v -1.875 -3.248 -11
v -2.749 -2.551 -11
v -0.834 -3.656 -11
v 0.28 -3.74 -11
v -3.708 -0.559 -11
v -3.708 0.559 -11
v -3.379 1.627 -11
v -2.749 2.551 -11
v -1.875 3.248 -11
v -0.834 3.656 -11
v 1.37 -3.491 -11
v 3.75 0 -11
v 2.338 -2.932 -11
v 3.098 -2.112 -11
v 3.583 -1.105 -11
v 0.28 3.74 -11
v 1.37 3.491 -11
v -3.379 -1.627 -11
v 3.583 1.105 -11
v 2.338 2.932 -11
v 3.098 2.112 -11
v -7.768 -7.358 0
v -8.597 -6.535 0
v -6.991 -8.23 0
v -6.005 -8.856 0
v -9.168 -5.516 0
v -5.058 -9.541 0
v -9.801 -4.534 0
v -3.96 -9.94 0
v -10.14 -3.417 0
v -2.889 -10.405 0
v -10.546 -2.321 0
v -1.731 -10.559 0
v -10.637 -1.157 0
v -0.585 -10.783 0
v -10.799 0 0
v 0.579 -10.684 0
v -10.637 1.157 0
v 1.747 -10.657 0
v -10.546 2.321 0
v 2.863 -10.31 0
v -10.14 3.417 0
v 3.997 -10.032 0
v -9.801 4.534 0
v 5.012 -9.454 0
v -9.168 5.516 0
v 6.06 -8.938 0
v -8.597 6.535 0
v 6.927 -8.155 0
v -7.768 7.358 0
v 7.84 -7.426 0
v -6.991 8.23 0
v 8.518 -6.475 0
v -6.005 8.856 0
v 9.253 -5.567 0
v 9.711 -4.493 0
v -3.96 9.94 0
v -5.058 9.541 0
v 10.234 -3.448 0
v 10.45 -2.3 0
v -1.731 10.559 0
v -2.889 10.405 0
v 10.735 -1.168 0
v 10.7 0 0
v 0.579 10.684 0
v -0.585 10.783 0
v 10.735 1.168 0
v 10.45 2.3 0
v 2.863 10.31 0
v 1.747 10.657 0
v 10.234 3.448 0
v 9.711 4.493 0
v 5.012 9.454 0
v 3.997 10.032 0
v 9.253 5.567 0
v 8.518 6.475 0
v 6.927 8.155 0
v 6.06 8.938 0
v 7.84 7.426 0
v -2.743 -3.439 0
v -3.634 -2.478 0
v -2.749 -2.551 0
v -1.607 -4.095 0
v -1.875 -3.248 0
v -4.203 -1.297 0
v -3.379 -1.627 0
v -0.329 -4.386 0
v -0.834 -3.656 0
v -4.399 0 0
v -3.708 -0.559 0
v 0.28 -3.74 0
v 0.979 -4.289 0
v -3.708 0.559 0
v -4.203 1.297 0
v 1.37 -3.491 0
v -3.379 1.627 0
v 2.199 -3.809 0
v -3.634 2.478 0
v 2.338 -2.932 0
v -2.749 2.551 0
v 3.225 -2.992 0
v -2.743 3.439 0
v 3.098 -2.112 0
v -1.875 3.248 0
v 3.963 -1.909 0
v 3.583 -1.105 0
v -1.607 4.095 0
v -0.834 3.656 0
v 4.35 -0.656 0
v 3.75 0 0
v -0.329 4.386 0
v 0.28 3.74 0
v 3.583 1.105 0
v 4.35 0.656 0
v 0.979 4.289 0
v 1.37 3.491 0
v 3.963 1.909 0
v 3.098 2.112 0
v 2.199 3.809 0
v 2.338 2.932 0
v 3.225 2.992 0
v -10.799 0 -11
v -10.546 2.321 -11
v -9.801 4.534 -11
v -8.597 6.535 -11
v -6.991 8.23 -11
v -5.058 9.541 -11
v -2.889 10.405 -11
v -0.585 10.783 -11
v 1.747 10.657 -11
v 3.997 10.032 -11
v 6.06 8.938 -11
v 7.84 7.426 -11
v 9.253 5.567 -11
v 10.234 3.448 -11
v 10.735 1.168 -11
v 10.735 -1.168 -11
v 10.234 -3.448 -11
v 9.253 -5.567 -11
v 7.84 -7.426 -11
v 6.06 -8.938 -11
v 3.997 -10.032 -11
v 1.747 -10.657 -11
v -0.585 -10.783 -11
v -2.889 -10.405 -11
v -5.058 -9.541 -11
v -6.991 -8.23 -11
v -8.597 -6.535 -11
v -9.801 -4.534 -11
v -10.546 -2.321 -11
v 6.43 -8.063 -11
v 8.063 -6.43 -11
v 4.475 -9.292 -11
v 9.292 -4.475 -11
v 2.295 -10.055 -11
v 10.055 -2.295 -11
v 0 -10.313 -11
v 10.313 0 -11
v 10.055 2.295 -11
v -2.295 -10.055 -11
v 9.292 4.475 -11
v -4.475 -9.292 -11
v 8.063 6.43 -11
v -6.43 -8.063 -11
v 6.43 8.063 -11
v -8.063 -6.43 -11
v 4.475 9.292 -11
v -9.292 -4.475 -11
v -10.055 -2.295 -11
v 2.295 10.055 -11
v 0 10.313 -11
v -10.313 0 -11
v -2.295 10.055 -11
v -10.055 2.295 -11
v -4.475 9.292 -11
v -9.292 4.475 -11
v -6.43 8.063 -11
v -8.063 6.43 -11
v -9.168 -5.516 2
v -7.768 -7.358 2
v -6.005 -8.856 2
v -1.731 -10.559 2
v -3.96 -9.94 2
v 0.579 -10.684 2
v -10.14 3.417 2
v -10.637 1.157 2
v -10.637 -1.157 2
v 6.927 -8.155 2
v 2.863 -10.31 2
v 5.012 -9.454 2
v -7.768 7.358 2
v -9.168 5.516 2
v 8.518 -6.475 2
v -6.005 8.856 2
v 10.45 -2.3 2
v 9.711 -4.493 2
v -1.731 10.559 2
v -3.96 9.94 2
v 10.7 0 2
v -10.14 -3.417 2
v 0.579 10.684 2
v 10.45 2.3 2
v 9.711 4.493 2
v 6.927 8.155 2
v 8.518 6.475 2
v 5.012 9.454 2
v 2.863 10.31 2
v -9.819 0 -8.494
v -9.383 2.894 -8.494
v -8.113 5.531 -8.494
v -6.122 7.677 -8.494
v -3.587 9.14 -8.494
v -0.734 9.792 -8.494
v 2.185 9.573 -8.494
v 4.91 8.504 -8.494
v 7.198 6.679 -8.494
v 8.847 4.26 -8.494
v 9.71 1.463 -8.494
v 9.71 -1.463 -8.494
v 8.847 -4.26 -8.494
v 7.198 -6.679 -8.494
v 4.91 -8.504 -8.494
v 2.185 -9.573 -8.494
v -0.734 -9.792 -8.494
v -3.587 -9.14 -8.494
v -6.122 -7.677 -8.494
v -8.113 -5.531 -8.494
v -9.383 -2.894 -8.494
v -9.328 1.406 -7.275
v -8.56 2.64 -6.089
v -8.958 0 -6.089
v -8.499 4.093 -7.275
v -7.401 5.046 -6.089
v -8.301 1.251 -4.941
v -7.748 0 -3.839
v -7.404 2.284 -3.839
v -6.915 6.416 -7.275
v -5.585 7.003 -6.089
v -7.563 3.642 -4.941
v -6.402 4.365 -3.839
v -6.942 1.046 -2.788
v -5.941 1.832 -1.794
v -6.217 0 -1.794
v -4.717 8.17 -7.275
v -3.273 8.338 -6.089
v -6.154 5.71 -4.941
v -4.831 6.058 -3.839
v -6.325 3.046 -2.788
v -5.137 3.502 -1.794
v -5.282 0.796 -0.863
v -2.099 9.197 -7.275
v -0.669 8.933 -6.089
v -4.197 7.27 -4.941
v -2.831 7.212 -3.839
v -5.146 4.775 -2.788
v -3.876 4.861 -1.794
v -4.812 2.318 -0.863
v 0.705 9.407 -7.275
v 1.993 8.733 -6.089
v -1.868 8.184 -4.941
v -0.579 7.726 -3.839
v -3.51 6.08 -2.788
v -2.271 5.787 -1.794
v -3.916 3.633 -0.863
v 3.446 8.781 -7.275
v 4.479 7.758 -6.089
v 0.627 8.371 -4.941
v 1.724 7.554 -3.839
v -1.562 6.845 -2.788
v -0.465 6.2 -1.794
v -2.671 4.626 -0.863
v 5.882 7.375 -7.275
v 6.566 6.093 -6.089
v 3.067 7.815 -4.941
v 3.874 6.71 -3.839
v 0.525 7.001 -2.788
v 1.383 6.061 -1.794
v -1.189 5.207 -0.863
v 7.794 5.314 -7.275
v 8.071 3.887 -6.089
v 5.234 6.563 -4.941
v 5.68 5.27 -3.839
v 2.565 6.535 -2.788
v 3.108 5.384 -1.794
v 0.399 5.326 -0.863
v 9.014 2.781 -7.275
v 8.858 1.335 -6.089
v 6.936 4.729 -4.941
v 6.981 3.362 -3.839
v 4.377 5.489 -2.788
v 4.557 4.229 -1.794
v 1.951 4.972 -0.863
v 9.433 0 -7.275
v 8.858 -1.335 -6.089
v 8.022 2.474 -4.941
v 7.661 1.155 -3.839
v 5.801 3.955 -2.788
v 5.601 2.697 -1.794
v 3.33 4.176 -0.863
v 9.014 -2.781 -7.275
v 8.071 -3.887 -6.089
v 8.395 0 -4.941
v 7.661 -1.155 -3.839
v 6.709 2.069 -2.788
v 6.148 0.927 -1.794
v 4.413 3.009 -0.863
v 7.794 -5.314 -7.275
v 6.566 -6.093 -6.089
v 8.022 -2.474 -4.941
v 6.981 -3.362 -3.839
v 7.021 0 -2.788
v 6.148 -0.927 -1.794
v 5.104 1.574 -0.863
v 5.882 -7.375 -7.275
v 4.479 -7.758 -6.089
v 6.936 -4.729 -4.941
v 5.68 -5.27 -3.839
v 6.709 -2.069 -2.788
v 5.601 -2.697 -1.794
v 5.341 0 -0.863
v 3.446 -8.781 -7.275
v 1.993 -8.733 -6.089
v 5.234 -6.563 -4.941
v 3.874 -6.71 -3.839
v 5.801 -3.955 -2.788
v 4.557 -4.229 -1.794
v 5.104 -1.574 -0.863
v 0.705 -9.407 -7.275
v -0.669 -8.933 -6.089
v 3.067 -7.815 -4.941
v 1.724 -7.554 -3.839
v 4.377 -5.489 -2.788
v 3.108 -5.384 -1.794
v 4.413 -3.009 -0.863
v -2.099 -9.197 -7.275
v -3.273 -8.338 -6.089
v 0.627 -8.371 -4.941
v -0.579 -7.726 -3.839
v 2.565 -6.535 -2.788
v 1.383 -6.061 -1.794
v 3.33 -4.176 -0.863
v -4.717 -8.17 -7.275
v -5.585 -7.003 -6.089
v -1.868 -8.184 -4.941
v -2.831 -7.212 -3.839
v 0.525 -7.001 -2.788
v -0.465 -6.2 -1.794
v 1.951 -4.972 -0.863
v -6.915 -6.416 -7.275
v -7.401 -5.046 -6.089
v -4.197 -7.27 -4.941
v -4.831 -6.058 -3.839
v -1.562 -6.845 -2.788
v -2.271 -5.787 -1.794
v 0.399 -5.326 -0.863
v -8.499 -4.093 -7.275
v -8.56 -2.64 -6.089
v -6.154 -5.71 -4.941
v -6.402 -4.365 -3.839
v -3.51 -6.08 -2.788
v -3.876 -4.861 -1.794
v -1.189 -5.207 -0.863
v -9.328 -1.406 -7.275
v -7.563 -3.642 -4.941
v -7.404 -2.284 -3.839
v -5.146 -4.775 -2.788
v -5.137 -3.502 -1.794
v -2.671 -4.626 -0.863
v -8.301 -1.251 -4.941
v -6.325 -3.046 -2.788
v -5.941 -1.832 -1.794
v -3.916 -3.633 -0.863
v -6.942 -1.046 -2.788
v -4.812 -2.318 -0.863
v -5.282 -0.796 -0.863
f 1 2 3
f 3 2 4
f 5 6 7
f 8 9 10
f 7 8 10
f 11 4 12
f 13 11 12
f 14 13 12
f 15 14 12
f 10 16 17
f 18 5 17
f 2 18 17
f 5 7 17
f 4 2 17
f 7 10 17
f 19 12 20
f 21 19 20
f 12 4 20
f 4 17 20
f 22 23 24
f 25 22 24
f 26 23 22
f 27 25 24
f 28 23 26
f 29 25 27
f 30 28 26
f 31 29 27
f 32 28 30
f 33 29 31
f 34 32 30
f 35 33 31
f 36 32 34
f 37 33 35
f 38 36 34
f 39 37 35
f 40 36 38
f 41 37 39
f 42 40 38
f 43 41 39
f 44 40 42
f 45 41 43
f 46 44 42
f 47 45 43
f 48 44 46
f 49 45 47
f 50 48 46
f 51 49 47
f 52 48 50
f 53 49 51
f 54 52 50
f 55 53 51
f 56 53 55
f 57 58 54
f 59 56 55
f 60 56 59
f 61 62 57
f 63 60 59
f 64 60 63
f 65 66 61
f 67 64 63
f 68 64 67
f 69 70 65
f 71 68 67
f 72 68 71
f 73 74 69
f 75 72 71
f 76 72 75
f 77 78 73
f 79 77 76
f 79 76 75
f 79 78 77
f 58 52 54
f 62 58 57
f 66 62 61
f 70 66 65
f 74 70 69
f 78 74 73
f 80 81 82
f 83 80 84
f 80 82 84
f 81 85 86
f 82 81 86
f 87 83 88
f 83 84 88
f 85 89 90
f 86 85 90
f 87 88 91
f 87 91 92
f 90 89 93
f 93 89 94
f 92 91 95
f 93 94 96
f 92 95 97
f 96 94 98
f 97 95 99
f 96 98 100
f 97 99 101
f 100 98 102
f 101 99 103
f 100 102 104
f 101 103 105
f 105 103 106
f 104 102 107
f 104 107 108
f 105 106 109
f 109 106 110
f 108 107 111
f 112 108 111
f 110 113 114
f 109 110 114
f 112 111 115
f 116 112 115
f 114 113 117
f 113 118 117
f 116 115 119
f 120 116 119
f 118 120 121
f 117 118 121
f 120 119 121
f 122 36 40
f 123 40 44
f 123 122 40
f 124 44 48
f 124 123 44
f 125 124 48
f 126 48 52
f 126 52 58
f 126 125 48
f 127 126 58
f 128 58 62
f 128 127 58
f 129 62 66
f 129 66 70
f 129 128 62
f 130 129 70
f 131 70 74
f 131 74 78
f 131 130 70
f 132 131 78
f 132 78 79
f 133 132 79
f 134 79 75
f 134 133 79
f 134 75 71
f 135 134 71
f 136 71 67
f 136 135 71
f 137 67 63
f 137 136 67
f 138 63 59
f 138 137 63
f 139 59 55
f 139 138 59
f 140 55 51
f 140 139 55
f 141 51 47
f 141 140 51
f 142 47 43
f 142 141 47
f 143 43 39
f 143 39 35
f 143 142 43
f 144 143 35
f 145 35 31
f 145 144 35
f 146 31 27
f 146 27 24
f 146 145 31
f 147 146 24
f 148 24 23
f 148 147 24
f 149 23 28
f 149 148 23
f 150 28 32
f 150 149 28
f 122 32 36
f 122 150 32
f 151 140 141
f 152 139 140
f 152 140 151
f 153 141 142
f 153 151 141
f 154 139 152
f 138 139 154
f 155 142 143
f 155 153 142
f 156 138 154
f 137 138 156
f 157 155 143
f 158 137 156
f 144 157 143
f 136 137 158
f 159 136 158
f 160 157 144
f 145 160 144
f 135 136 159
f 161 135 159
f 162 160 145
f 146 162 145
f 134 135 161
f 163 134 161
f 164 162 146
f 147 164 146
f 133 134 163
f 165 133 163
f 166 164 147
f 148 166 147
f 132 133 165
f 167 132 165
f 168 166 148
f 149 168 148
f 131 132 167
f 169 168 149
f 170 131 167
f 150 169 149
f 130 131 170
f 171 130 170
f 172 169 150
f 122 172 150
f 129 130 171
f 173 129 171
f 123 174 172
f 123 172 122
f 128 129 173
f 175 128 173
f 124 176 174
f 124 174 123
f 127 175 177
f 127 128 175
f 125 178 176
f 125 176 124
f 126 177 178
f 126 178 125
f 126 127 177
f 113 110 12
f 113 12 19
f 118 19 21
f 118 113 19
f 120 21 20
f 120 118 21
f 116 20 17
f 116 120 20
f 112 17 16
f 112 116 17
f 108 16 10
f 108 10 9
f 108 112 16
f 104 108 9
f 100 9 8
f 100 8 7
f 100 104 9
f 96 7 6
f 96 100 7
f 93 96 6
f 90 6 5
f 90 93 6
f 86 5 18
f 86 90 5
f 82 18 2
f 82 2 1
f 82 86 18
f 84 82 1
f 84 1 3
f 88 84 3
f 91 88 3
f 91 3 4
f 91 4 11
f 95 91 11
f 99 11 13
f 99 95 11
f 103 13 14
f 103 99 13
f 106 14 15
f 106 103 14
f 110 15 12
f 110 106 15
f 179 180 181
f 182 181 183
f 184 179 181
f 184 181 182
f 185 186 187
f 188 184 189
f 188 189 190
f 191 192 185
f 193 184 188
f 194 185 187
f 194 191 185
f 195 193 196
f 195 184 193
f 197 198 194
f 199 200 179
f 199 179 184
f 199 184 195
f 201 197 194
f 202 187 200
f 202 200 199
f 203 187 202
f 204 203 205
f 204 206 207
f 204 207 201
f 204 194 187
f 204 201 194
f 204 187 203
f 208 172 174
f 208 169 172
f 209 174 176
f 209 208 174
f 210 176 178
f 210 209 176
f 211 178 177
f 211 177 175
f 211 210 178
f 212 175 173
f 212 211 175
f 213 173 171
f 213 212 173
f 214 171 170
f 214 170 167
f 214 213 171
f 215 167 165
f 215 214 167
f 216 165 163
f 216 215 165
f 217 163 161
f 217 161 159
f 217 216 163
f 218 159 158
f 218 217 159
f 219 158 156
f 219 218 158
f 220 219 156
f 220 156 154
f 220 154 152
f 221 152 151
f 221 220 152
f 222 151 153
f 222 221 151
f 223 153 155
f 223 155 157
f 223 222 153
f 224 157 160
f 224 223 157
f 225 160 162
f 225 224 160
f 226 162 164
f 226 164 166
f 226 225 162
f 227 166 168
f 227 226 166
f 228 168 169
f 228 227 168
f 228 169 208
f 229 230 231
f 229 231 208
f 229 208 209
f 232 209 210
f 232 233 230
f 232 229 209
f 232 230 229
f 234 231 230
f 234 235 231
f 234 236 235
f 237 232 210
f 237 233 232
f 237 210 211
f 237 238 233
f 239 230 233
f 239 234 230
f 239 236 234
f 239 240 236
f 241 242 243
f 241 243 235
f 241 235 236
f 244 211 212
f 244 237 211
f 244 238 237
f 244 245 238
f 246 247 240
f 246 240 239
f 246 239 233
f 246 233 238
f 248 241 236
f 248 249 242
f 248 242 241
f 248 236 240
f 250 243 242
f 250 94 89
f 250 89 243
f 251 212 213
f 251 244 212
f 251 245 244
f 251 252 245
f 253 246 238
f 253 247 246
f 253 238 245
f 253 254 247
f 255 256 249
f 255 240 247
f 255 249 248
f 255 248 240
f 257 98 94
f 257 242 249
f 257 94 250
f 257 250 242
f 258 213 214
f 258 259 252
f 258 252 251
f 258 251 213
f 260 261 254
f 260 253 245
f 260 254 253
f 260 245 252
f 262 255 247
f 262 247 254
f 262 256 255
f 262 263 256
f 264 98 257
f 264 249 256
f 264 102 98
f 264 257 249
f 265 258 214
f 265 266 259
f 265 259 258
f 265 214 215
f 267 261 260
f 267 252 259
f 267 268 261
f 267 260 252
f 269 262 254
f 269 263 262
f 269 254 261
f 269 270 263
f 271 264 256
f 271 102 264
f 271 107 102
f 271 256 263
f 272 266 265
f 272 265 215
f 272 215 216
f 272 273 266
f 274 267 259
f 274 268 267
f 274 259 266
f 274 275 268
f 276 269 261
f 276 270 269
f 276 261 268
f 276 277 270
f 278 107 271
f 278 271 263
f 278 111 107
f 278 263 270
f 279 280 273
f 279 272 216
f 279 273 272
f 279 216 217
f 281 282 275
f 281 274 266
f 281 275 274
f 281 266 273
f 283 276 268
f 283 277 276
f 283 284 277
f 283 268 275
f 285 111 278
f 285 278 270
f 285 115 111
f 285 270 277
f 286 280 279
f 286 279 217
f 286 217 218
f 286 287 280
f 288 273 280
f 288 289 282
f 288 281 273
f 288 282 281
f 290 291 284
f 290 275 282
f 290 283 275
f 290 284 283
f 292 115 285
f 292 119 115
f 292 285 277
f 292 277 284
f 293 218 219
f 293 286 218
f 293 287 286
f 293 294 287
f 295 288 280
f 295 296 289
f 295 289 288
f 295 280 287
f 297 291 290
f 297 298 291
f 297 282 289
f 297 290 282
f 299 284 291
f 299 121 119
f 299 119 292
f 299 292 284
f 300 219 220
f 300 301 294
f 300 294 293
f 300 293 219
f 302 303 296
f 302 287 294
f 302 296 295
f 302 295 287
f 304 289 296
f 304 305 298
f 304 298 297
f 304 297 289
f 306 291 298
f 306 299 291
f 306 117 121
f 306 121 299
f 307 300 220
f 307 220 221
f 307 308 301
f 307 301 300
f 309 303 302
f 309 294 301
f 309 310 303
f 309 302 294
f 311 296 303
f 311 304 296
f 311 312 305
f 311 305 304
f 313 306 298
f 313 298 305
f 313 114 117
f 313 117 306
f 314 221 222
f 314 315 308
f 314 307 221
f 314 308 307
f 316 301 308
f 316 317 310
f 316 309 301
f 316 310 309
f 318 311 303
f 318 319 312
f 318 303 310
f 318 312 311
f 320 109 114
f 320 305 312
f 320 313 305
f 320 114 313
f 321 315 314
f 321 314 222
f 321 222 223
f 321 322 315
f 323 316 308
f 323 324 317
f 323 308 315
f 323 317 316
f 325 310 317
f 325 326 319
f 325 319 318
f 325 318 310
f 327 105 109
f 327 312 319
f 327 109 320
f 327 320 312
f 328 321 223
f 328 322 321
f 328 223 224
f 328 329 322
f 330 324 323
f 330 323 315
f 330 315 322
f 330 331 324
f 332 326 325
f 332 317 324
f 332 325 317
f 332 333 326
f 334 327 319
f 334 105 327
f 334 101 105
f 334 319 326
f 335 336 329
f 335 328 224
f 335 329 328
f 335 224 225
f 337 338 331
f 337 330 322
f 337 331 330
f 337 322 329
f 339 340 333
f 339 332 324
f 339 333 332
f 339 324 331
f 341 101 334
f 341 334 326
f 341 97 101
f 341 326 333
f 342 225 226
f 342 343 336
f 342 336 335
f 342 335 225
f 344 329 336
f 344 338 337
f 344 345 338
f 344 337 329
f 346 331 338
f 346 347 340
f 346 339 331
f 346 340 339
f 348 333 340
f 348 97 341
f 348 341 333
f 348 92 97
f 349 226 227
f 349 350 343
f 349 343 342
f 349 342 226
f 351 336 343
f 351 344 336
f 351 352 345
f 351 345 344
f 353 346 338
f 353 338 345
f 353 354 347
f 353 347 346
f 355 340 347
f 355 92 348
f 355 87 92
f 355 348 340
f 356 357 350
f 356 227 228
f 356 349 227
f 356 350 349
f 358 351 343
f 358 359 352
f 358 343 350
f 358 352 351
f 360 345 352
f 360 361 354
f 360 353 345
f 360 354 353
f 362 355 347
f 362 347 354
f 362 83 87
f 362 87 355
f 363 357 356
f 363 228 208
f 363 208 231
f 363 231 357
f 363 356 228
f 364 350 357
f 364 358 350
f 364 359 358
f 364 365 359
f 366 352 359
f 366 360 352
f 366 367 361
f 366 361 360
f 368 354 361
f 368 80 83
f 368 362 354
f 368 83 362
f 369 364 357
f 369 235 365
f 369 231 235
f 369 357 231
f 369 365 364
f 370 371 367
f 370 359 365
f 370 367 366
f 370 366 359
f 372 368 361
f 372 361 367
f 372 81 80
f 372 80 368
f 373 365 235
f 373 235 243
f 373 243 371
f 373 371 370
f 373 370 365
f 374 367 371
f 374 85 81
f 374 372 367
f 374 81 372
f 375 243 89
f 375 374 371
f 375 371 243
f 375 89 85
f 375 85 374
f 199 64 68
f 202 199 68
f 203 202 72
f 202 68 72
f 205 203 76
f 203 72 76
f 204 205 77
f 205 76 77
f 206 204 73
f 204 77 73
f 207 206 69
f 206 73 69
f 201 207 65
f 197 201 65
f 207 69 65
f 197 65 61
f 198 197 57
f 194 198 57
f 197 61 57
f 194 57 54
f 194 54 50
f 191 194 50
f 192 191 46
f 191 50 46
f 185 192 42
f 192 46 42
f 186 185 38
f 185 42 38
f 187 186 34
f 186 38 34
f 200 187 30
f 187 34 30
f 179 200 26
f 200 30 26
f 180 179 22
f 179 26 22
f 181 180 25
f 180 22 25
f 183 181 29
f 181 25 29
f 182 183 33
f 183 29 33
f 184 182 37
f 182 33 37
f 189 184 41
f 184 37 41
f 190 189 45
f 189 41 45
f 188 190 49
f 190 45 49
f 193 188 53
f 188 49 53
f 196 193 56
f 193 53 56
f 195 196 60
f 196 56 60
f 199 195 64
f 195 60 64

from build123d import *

# Parameters (mm, degrees)
F0_R     = 10.7
F1_DEPTH = 2
F2_R     = 3.75
F3_DEPTH = 11


with BuildPart() as f1:
    # F0 (on Top) → F1 (new body)
    with BuildSketch(Plane.XY):
        Circle(F0_R)
    extrude(amount=F1_DEPTH)

    # F2 (on Top) → F3 (join)
    with BuildSketch(Plane.XY):
        Circle(F2_R)
    extrude(amount=-F3_DEPTH)

    # F4 (on Front) → F5 (revolve)
    with BuildSketch(Plane.XZ):
        with BuildLine():
            Line((-4.3987915084, 0), (-10.7987915084, 0))
            Line((-10.7987915084, 0), (-10.7987915084, -11))
            Line((-10.7987915084, -11), (-10.3134103119, -11))
            ThreePointArc((-10.3134103119, -11), (-8.3948121612, -4.9414926276), (-4.3987915084, 0))
        make_face()
    revolve(axis=Axis((0, 0, -4.4246494012), (0, 0, -1)))


solid = f1.part
